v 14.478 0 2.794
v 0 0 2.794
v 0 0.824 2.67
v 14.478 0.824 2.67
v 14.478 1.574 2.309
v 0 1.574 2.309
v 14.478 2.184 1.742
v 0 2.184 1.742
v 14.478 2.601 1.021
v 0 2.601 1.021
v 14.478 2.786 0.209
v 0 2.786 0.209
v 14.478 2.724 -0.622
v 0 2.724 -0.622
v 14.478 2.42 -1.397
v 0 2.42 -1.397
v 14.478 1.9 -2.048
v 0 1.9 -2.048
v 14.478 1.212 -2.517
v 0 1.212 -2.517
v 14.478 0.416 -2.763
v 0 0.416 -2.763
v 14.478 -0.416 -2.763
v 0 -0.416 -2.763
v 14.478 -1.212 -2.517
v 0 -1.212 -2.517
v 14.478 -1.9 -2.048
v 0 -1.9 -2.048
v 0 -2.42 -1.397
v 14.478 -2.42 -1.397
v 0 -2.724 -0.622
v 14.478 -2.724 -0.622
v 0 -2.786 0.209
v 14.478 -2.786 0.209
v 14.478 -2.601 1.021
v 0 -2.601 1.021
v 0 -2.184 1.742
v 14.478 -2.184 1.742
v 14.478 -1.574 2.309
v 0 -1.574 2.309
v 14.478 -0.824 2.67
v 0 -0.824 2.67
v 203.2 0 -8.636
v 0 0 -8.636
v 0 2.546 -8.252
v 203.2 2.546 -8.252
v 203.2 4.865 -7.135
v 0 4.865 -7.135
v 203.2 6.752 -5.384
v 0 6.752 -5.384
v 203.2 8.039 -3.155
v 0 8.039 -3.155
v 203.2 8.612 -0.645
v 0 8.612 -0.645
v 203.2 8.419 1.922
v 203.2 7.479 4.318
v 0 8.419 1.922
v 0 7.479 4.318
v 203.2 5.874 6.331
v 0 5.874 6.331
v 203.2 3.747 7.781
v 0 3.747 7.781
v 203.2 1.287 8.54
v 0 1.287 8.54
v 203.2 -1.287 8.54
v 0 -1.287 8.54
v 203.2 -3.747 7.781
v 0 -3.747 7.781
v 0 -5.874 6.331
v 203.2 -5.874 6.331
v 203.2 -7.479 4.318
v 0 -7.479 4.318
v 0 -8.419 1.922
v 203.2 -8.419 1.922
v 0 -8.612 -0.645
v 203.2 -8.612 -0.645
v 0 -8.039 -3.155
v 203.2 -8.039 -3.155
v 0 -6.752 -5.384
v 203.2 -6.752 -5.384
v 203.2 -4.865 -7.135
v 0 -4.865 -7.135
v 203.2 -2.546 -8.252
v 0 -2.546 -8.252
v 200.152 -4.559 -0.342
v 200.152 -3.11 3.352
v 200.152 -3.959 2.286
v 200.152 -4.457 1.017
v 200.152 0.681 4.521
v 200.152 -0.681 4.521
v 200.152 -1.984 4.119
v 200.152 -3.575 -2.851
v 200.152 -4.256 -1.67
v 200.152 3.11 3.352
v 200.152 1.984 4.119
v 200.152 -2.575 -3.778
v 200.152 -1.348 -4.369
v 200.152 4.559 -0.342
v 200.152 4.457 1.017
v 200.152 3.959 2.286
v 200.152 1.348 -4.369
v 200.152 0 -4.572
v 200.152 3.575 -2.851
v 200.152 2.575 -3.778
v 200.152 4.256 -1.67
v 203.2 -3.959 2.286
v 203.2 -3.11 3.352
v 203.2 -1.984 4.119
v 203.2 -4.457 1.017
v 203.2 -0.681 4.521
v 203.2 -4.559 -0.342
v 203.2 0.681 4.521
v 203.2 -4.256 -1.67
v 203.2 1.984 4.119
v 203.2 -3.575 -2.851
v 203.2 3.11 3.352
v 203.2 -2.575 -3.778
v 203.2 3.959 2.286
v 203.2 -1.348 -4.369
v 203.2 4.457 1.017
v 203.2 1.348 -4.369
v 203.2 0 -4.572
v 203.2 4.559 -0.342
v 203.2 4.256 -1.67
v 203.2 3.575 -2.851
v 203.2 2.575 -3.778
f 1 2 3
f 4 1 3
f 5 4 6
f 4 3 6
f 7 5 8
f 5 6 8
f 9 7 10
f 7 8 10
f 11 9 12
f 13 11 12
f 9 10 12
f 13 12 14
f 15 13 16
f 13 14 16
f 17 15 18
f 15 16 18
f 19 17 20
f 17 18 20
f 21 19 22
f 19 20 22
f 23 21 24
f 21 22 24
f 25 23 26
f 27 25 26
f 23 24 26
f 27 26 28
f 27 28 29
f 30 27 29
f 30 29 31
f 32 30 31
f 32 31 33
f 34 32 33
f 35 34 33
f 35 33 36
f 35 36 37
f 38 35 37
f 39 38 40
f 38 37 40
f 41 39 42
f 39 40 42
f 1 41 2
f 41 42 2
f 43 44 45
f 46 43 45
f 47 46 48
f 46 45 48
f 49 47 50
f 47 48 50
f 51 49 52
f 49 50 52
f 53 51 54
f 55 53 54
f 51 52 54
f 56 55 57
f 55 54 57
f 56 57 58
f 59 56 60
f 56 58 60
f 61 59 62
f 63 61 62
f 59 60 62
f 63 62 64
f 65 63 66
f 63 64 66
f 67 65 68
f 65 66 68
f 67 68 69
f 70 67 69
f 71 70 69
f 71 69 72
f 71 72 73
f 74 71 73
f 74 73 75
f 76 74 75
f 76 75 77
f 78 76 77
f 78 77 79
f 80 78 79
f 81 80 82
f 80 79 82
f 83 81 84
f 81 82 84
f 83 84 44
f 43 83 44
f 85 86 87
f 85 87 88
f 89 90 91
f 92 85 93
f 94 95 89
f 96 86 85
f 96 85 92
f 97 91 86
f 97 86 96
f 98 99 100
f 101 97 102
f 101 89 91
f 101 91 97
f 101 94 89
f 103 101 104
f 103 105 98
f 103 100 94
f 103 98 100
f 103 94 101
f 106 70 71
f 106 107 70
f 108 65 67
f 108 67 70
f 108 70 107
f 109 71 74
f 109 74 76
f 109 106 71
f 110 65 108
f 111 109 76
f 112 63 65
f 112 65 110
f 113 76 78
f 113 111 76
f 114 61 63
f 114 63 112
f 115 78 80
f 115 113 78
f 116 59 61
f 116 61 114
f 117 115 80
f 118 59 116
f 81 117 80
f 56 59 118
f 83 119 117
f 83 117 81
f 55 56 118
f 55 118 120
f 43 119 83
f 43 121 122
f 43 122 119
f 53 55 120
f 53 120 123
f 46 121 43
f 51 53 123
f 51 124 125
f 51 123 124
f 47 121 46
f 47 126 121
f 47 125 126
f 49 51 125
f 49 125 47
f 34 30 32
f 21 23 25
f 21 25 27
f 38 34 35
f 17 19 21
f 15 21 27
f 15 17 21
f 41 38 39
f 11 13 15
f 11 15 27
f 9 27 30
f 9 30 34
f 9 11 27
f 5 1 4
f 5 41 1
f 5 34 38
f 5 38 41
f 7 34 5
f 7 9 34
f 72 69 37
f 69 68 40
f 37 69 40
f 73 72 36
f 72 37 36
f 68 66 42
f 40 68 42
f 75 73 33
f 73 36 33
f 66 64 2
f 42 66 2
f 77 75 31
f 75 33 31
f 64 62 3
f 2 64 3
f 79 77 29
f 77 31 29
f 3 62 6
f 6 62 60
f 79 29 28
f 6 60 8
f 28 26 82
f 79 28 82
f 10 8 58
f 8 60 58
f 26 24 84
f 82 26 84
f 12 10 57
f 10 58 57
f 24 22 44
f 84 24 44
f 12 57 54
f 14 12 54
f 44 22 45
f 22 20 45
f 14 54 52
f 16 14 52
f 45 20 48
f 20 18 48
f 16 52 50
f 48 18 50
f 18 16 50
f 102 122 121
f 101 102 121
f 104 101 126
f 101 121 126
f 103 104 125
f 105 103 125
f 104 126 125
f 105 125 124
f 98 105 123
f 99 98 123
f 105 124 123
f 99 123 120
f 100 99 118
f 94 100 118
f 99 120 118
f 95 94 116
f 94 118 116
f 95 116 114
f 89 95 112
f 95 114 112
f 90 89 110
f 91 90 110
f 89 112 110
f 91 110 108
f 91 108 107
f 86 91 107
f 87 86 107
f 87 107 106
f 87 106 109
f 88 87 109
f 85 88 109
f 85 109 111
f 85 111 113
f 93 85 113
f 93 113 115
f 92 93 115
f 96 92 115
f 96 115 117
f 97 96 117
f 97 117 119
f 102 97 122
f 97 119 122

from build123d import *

# Parameters (mm, degrees)
SKETCH1_R           = 8.636
BOSS_EXTRUDE1_DEPTH = 203.2
SKETCH2_R           = 4.572
CUT_EXTRUDE1_DEPTH  = 3.048
SKETCH3_R           = 2.794
CUT_EXTRUDE2_DEPTH  = 14.478


with BuildPart() as part:
    # Sketch1 → Boss-Extrude1 (new body)
    with BuildSketch(Plane(origin=(0, 0, 0), x_dir=(0, 0, -1), z_dir=(1, 0, 0))):
        Circle(SKETCH1_R)
    extrude(amount=BOSS_EXTRUDE1_DEPTH)

    # Sketch2 → Cut-Extrude1 (cut)
    with BuildSketch(Plane(origin=(203.2, 0, 0), x_dir=(0, 0, -1), z_dir=(1, 0, 0))):
        Circle(SKETCH2_R)
    extrude(amount=-CUT_EXTRUDE1_DEPTH, mode=Mode.SUBTRACT)

    # Sketch3 → Cut-Extrude2 (cut)
    with BuildSketch(Plane.ZY):
        Circle(SKETCH3_R)
    extrude(amount=-CUT_EXTRUDE2_DEPTH, mode=Mode.SUBTRACT)


solid = part.part
